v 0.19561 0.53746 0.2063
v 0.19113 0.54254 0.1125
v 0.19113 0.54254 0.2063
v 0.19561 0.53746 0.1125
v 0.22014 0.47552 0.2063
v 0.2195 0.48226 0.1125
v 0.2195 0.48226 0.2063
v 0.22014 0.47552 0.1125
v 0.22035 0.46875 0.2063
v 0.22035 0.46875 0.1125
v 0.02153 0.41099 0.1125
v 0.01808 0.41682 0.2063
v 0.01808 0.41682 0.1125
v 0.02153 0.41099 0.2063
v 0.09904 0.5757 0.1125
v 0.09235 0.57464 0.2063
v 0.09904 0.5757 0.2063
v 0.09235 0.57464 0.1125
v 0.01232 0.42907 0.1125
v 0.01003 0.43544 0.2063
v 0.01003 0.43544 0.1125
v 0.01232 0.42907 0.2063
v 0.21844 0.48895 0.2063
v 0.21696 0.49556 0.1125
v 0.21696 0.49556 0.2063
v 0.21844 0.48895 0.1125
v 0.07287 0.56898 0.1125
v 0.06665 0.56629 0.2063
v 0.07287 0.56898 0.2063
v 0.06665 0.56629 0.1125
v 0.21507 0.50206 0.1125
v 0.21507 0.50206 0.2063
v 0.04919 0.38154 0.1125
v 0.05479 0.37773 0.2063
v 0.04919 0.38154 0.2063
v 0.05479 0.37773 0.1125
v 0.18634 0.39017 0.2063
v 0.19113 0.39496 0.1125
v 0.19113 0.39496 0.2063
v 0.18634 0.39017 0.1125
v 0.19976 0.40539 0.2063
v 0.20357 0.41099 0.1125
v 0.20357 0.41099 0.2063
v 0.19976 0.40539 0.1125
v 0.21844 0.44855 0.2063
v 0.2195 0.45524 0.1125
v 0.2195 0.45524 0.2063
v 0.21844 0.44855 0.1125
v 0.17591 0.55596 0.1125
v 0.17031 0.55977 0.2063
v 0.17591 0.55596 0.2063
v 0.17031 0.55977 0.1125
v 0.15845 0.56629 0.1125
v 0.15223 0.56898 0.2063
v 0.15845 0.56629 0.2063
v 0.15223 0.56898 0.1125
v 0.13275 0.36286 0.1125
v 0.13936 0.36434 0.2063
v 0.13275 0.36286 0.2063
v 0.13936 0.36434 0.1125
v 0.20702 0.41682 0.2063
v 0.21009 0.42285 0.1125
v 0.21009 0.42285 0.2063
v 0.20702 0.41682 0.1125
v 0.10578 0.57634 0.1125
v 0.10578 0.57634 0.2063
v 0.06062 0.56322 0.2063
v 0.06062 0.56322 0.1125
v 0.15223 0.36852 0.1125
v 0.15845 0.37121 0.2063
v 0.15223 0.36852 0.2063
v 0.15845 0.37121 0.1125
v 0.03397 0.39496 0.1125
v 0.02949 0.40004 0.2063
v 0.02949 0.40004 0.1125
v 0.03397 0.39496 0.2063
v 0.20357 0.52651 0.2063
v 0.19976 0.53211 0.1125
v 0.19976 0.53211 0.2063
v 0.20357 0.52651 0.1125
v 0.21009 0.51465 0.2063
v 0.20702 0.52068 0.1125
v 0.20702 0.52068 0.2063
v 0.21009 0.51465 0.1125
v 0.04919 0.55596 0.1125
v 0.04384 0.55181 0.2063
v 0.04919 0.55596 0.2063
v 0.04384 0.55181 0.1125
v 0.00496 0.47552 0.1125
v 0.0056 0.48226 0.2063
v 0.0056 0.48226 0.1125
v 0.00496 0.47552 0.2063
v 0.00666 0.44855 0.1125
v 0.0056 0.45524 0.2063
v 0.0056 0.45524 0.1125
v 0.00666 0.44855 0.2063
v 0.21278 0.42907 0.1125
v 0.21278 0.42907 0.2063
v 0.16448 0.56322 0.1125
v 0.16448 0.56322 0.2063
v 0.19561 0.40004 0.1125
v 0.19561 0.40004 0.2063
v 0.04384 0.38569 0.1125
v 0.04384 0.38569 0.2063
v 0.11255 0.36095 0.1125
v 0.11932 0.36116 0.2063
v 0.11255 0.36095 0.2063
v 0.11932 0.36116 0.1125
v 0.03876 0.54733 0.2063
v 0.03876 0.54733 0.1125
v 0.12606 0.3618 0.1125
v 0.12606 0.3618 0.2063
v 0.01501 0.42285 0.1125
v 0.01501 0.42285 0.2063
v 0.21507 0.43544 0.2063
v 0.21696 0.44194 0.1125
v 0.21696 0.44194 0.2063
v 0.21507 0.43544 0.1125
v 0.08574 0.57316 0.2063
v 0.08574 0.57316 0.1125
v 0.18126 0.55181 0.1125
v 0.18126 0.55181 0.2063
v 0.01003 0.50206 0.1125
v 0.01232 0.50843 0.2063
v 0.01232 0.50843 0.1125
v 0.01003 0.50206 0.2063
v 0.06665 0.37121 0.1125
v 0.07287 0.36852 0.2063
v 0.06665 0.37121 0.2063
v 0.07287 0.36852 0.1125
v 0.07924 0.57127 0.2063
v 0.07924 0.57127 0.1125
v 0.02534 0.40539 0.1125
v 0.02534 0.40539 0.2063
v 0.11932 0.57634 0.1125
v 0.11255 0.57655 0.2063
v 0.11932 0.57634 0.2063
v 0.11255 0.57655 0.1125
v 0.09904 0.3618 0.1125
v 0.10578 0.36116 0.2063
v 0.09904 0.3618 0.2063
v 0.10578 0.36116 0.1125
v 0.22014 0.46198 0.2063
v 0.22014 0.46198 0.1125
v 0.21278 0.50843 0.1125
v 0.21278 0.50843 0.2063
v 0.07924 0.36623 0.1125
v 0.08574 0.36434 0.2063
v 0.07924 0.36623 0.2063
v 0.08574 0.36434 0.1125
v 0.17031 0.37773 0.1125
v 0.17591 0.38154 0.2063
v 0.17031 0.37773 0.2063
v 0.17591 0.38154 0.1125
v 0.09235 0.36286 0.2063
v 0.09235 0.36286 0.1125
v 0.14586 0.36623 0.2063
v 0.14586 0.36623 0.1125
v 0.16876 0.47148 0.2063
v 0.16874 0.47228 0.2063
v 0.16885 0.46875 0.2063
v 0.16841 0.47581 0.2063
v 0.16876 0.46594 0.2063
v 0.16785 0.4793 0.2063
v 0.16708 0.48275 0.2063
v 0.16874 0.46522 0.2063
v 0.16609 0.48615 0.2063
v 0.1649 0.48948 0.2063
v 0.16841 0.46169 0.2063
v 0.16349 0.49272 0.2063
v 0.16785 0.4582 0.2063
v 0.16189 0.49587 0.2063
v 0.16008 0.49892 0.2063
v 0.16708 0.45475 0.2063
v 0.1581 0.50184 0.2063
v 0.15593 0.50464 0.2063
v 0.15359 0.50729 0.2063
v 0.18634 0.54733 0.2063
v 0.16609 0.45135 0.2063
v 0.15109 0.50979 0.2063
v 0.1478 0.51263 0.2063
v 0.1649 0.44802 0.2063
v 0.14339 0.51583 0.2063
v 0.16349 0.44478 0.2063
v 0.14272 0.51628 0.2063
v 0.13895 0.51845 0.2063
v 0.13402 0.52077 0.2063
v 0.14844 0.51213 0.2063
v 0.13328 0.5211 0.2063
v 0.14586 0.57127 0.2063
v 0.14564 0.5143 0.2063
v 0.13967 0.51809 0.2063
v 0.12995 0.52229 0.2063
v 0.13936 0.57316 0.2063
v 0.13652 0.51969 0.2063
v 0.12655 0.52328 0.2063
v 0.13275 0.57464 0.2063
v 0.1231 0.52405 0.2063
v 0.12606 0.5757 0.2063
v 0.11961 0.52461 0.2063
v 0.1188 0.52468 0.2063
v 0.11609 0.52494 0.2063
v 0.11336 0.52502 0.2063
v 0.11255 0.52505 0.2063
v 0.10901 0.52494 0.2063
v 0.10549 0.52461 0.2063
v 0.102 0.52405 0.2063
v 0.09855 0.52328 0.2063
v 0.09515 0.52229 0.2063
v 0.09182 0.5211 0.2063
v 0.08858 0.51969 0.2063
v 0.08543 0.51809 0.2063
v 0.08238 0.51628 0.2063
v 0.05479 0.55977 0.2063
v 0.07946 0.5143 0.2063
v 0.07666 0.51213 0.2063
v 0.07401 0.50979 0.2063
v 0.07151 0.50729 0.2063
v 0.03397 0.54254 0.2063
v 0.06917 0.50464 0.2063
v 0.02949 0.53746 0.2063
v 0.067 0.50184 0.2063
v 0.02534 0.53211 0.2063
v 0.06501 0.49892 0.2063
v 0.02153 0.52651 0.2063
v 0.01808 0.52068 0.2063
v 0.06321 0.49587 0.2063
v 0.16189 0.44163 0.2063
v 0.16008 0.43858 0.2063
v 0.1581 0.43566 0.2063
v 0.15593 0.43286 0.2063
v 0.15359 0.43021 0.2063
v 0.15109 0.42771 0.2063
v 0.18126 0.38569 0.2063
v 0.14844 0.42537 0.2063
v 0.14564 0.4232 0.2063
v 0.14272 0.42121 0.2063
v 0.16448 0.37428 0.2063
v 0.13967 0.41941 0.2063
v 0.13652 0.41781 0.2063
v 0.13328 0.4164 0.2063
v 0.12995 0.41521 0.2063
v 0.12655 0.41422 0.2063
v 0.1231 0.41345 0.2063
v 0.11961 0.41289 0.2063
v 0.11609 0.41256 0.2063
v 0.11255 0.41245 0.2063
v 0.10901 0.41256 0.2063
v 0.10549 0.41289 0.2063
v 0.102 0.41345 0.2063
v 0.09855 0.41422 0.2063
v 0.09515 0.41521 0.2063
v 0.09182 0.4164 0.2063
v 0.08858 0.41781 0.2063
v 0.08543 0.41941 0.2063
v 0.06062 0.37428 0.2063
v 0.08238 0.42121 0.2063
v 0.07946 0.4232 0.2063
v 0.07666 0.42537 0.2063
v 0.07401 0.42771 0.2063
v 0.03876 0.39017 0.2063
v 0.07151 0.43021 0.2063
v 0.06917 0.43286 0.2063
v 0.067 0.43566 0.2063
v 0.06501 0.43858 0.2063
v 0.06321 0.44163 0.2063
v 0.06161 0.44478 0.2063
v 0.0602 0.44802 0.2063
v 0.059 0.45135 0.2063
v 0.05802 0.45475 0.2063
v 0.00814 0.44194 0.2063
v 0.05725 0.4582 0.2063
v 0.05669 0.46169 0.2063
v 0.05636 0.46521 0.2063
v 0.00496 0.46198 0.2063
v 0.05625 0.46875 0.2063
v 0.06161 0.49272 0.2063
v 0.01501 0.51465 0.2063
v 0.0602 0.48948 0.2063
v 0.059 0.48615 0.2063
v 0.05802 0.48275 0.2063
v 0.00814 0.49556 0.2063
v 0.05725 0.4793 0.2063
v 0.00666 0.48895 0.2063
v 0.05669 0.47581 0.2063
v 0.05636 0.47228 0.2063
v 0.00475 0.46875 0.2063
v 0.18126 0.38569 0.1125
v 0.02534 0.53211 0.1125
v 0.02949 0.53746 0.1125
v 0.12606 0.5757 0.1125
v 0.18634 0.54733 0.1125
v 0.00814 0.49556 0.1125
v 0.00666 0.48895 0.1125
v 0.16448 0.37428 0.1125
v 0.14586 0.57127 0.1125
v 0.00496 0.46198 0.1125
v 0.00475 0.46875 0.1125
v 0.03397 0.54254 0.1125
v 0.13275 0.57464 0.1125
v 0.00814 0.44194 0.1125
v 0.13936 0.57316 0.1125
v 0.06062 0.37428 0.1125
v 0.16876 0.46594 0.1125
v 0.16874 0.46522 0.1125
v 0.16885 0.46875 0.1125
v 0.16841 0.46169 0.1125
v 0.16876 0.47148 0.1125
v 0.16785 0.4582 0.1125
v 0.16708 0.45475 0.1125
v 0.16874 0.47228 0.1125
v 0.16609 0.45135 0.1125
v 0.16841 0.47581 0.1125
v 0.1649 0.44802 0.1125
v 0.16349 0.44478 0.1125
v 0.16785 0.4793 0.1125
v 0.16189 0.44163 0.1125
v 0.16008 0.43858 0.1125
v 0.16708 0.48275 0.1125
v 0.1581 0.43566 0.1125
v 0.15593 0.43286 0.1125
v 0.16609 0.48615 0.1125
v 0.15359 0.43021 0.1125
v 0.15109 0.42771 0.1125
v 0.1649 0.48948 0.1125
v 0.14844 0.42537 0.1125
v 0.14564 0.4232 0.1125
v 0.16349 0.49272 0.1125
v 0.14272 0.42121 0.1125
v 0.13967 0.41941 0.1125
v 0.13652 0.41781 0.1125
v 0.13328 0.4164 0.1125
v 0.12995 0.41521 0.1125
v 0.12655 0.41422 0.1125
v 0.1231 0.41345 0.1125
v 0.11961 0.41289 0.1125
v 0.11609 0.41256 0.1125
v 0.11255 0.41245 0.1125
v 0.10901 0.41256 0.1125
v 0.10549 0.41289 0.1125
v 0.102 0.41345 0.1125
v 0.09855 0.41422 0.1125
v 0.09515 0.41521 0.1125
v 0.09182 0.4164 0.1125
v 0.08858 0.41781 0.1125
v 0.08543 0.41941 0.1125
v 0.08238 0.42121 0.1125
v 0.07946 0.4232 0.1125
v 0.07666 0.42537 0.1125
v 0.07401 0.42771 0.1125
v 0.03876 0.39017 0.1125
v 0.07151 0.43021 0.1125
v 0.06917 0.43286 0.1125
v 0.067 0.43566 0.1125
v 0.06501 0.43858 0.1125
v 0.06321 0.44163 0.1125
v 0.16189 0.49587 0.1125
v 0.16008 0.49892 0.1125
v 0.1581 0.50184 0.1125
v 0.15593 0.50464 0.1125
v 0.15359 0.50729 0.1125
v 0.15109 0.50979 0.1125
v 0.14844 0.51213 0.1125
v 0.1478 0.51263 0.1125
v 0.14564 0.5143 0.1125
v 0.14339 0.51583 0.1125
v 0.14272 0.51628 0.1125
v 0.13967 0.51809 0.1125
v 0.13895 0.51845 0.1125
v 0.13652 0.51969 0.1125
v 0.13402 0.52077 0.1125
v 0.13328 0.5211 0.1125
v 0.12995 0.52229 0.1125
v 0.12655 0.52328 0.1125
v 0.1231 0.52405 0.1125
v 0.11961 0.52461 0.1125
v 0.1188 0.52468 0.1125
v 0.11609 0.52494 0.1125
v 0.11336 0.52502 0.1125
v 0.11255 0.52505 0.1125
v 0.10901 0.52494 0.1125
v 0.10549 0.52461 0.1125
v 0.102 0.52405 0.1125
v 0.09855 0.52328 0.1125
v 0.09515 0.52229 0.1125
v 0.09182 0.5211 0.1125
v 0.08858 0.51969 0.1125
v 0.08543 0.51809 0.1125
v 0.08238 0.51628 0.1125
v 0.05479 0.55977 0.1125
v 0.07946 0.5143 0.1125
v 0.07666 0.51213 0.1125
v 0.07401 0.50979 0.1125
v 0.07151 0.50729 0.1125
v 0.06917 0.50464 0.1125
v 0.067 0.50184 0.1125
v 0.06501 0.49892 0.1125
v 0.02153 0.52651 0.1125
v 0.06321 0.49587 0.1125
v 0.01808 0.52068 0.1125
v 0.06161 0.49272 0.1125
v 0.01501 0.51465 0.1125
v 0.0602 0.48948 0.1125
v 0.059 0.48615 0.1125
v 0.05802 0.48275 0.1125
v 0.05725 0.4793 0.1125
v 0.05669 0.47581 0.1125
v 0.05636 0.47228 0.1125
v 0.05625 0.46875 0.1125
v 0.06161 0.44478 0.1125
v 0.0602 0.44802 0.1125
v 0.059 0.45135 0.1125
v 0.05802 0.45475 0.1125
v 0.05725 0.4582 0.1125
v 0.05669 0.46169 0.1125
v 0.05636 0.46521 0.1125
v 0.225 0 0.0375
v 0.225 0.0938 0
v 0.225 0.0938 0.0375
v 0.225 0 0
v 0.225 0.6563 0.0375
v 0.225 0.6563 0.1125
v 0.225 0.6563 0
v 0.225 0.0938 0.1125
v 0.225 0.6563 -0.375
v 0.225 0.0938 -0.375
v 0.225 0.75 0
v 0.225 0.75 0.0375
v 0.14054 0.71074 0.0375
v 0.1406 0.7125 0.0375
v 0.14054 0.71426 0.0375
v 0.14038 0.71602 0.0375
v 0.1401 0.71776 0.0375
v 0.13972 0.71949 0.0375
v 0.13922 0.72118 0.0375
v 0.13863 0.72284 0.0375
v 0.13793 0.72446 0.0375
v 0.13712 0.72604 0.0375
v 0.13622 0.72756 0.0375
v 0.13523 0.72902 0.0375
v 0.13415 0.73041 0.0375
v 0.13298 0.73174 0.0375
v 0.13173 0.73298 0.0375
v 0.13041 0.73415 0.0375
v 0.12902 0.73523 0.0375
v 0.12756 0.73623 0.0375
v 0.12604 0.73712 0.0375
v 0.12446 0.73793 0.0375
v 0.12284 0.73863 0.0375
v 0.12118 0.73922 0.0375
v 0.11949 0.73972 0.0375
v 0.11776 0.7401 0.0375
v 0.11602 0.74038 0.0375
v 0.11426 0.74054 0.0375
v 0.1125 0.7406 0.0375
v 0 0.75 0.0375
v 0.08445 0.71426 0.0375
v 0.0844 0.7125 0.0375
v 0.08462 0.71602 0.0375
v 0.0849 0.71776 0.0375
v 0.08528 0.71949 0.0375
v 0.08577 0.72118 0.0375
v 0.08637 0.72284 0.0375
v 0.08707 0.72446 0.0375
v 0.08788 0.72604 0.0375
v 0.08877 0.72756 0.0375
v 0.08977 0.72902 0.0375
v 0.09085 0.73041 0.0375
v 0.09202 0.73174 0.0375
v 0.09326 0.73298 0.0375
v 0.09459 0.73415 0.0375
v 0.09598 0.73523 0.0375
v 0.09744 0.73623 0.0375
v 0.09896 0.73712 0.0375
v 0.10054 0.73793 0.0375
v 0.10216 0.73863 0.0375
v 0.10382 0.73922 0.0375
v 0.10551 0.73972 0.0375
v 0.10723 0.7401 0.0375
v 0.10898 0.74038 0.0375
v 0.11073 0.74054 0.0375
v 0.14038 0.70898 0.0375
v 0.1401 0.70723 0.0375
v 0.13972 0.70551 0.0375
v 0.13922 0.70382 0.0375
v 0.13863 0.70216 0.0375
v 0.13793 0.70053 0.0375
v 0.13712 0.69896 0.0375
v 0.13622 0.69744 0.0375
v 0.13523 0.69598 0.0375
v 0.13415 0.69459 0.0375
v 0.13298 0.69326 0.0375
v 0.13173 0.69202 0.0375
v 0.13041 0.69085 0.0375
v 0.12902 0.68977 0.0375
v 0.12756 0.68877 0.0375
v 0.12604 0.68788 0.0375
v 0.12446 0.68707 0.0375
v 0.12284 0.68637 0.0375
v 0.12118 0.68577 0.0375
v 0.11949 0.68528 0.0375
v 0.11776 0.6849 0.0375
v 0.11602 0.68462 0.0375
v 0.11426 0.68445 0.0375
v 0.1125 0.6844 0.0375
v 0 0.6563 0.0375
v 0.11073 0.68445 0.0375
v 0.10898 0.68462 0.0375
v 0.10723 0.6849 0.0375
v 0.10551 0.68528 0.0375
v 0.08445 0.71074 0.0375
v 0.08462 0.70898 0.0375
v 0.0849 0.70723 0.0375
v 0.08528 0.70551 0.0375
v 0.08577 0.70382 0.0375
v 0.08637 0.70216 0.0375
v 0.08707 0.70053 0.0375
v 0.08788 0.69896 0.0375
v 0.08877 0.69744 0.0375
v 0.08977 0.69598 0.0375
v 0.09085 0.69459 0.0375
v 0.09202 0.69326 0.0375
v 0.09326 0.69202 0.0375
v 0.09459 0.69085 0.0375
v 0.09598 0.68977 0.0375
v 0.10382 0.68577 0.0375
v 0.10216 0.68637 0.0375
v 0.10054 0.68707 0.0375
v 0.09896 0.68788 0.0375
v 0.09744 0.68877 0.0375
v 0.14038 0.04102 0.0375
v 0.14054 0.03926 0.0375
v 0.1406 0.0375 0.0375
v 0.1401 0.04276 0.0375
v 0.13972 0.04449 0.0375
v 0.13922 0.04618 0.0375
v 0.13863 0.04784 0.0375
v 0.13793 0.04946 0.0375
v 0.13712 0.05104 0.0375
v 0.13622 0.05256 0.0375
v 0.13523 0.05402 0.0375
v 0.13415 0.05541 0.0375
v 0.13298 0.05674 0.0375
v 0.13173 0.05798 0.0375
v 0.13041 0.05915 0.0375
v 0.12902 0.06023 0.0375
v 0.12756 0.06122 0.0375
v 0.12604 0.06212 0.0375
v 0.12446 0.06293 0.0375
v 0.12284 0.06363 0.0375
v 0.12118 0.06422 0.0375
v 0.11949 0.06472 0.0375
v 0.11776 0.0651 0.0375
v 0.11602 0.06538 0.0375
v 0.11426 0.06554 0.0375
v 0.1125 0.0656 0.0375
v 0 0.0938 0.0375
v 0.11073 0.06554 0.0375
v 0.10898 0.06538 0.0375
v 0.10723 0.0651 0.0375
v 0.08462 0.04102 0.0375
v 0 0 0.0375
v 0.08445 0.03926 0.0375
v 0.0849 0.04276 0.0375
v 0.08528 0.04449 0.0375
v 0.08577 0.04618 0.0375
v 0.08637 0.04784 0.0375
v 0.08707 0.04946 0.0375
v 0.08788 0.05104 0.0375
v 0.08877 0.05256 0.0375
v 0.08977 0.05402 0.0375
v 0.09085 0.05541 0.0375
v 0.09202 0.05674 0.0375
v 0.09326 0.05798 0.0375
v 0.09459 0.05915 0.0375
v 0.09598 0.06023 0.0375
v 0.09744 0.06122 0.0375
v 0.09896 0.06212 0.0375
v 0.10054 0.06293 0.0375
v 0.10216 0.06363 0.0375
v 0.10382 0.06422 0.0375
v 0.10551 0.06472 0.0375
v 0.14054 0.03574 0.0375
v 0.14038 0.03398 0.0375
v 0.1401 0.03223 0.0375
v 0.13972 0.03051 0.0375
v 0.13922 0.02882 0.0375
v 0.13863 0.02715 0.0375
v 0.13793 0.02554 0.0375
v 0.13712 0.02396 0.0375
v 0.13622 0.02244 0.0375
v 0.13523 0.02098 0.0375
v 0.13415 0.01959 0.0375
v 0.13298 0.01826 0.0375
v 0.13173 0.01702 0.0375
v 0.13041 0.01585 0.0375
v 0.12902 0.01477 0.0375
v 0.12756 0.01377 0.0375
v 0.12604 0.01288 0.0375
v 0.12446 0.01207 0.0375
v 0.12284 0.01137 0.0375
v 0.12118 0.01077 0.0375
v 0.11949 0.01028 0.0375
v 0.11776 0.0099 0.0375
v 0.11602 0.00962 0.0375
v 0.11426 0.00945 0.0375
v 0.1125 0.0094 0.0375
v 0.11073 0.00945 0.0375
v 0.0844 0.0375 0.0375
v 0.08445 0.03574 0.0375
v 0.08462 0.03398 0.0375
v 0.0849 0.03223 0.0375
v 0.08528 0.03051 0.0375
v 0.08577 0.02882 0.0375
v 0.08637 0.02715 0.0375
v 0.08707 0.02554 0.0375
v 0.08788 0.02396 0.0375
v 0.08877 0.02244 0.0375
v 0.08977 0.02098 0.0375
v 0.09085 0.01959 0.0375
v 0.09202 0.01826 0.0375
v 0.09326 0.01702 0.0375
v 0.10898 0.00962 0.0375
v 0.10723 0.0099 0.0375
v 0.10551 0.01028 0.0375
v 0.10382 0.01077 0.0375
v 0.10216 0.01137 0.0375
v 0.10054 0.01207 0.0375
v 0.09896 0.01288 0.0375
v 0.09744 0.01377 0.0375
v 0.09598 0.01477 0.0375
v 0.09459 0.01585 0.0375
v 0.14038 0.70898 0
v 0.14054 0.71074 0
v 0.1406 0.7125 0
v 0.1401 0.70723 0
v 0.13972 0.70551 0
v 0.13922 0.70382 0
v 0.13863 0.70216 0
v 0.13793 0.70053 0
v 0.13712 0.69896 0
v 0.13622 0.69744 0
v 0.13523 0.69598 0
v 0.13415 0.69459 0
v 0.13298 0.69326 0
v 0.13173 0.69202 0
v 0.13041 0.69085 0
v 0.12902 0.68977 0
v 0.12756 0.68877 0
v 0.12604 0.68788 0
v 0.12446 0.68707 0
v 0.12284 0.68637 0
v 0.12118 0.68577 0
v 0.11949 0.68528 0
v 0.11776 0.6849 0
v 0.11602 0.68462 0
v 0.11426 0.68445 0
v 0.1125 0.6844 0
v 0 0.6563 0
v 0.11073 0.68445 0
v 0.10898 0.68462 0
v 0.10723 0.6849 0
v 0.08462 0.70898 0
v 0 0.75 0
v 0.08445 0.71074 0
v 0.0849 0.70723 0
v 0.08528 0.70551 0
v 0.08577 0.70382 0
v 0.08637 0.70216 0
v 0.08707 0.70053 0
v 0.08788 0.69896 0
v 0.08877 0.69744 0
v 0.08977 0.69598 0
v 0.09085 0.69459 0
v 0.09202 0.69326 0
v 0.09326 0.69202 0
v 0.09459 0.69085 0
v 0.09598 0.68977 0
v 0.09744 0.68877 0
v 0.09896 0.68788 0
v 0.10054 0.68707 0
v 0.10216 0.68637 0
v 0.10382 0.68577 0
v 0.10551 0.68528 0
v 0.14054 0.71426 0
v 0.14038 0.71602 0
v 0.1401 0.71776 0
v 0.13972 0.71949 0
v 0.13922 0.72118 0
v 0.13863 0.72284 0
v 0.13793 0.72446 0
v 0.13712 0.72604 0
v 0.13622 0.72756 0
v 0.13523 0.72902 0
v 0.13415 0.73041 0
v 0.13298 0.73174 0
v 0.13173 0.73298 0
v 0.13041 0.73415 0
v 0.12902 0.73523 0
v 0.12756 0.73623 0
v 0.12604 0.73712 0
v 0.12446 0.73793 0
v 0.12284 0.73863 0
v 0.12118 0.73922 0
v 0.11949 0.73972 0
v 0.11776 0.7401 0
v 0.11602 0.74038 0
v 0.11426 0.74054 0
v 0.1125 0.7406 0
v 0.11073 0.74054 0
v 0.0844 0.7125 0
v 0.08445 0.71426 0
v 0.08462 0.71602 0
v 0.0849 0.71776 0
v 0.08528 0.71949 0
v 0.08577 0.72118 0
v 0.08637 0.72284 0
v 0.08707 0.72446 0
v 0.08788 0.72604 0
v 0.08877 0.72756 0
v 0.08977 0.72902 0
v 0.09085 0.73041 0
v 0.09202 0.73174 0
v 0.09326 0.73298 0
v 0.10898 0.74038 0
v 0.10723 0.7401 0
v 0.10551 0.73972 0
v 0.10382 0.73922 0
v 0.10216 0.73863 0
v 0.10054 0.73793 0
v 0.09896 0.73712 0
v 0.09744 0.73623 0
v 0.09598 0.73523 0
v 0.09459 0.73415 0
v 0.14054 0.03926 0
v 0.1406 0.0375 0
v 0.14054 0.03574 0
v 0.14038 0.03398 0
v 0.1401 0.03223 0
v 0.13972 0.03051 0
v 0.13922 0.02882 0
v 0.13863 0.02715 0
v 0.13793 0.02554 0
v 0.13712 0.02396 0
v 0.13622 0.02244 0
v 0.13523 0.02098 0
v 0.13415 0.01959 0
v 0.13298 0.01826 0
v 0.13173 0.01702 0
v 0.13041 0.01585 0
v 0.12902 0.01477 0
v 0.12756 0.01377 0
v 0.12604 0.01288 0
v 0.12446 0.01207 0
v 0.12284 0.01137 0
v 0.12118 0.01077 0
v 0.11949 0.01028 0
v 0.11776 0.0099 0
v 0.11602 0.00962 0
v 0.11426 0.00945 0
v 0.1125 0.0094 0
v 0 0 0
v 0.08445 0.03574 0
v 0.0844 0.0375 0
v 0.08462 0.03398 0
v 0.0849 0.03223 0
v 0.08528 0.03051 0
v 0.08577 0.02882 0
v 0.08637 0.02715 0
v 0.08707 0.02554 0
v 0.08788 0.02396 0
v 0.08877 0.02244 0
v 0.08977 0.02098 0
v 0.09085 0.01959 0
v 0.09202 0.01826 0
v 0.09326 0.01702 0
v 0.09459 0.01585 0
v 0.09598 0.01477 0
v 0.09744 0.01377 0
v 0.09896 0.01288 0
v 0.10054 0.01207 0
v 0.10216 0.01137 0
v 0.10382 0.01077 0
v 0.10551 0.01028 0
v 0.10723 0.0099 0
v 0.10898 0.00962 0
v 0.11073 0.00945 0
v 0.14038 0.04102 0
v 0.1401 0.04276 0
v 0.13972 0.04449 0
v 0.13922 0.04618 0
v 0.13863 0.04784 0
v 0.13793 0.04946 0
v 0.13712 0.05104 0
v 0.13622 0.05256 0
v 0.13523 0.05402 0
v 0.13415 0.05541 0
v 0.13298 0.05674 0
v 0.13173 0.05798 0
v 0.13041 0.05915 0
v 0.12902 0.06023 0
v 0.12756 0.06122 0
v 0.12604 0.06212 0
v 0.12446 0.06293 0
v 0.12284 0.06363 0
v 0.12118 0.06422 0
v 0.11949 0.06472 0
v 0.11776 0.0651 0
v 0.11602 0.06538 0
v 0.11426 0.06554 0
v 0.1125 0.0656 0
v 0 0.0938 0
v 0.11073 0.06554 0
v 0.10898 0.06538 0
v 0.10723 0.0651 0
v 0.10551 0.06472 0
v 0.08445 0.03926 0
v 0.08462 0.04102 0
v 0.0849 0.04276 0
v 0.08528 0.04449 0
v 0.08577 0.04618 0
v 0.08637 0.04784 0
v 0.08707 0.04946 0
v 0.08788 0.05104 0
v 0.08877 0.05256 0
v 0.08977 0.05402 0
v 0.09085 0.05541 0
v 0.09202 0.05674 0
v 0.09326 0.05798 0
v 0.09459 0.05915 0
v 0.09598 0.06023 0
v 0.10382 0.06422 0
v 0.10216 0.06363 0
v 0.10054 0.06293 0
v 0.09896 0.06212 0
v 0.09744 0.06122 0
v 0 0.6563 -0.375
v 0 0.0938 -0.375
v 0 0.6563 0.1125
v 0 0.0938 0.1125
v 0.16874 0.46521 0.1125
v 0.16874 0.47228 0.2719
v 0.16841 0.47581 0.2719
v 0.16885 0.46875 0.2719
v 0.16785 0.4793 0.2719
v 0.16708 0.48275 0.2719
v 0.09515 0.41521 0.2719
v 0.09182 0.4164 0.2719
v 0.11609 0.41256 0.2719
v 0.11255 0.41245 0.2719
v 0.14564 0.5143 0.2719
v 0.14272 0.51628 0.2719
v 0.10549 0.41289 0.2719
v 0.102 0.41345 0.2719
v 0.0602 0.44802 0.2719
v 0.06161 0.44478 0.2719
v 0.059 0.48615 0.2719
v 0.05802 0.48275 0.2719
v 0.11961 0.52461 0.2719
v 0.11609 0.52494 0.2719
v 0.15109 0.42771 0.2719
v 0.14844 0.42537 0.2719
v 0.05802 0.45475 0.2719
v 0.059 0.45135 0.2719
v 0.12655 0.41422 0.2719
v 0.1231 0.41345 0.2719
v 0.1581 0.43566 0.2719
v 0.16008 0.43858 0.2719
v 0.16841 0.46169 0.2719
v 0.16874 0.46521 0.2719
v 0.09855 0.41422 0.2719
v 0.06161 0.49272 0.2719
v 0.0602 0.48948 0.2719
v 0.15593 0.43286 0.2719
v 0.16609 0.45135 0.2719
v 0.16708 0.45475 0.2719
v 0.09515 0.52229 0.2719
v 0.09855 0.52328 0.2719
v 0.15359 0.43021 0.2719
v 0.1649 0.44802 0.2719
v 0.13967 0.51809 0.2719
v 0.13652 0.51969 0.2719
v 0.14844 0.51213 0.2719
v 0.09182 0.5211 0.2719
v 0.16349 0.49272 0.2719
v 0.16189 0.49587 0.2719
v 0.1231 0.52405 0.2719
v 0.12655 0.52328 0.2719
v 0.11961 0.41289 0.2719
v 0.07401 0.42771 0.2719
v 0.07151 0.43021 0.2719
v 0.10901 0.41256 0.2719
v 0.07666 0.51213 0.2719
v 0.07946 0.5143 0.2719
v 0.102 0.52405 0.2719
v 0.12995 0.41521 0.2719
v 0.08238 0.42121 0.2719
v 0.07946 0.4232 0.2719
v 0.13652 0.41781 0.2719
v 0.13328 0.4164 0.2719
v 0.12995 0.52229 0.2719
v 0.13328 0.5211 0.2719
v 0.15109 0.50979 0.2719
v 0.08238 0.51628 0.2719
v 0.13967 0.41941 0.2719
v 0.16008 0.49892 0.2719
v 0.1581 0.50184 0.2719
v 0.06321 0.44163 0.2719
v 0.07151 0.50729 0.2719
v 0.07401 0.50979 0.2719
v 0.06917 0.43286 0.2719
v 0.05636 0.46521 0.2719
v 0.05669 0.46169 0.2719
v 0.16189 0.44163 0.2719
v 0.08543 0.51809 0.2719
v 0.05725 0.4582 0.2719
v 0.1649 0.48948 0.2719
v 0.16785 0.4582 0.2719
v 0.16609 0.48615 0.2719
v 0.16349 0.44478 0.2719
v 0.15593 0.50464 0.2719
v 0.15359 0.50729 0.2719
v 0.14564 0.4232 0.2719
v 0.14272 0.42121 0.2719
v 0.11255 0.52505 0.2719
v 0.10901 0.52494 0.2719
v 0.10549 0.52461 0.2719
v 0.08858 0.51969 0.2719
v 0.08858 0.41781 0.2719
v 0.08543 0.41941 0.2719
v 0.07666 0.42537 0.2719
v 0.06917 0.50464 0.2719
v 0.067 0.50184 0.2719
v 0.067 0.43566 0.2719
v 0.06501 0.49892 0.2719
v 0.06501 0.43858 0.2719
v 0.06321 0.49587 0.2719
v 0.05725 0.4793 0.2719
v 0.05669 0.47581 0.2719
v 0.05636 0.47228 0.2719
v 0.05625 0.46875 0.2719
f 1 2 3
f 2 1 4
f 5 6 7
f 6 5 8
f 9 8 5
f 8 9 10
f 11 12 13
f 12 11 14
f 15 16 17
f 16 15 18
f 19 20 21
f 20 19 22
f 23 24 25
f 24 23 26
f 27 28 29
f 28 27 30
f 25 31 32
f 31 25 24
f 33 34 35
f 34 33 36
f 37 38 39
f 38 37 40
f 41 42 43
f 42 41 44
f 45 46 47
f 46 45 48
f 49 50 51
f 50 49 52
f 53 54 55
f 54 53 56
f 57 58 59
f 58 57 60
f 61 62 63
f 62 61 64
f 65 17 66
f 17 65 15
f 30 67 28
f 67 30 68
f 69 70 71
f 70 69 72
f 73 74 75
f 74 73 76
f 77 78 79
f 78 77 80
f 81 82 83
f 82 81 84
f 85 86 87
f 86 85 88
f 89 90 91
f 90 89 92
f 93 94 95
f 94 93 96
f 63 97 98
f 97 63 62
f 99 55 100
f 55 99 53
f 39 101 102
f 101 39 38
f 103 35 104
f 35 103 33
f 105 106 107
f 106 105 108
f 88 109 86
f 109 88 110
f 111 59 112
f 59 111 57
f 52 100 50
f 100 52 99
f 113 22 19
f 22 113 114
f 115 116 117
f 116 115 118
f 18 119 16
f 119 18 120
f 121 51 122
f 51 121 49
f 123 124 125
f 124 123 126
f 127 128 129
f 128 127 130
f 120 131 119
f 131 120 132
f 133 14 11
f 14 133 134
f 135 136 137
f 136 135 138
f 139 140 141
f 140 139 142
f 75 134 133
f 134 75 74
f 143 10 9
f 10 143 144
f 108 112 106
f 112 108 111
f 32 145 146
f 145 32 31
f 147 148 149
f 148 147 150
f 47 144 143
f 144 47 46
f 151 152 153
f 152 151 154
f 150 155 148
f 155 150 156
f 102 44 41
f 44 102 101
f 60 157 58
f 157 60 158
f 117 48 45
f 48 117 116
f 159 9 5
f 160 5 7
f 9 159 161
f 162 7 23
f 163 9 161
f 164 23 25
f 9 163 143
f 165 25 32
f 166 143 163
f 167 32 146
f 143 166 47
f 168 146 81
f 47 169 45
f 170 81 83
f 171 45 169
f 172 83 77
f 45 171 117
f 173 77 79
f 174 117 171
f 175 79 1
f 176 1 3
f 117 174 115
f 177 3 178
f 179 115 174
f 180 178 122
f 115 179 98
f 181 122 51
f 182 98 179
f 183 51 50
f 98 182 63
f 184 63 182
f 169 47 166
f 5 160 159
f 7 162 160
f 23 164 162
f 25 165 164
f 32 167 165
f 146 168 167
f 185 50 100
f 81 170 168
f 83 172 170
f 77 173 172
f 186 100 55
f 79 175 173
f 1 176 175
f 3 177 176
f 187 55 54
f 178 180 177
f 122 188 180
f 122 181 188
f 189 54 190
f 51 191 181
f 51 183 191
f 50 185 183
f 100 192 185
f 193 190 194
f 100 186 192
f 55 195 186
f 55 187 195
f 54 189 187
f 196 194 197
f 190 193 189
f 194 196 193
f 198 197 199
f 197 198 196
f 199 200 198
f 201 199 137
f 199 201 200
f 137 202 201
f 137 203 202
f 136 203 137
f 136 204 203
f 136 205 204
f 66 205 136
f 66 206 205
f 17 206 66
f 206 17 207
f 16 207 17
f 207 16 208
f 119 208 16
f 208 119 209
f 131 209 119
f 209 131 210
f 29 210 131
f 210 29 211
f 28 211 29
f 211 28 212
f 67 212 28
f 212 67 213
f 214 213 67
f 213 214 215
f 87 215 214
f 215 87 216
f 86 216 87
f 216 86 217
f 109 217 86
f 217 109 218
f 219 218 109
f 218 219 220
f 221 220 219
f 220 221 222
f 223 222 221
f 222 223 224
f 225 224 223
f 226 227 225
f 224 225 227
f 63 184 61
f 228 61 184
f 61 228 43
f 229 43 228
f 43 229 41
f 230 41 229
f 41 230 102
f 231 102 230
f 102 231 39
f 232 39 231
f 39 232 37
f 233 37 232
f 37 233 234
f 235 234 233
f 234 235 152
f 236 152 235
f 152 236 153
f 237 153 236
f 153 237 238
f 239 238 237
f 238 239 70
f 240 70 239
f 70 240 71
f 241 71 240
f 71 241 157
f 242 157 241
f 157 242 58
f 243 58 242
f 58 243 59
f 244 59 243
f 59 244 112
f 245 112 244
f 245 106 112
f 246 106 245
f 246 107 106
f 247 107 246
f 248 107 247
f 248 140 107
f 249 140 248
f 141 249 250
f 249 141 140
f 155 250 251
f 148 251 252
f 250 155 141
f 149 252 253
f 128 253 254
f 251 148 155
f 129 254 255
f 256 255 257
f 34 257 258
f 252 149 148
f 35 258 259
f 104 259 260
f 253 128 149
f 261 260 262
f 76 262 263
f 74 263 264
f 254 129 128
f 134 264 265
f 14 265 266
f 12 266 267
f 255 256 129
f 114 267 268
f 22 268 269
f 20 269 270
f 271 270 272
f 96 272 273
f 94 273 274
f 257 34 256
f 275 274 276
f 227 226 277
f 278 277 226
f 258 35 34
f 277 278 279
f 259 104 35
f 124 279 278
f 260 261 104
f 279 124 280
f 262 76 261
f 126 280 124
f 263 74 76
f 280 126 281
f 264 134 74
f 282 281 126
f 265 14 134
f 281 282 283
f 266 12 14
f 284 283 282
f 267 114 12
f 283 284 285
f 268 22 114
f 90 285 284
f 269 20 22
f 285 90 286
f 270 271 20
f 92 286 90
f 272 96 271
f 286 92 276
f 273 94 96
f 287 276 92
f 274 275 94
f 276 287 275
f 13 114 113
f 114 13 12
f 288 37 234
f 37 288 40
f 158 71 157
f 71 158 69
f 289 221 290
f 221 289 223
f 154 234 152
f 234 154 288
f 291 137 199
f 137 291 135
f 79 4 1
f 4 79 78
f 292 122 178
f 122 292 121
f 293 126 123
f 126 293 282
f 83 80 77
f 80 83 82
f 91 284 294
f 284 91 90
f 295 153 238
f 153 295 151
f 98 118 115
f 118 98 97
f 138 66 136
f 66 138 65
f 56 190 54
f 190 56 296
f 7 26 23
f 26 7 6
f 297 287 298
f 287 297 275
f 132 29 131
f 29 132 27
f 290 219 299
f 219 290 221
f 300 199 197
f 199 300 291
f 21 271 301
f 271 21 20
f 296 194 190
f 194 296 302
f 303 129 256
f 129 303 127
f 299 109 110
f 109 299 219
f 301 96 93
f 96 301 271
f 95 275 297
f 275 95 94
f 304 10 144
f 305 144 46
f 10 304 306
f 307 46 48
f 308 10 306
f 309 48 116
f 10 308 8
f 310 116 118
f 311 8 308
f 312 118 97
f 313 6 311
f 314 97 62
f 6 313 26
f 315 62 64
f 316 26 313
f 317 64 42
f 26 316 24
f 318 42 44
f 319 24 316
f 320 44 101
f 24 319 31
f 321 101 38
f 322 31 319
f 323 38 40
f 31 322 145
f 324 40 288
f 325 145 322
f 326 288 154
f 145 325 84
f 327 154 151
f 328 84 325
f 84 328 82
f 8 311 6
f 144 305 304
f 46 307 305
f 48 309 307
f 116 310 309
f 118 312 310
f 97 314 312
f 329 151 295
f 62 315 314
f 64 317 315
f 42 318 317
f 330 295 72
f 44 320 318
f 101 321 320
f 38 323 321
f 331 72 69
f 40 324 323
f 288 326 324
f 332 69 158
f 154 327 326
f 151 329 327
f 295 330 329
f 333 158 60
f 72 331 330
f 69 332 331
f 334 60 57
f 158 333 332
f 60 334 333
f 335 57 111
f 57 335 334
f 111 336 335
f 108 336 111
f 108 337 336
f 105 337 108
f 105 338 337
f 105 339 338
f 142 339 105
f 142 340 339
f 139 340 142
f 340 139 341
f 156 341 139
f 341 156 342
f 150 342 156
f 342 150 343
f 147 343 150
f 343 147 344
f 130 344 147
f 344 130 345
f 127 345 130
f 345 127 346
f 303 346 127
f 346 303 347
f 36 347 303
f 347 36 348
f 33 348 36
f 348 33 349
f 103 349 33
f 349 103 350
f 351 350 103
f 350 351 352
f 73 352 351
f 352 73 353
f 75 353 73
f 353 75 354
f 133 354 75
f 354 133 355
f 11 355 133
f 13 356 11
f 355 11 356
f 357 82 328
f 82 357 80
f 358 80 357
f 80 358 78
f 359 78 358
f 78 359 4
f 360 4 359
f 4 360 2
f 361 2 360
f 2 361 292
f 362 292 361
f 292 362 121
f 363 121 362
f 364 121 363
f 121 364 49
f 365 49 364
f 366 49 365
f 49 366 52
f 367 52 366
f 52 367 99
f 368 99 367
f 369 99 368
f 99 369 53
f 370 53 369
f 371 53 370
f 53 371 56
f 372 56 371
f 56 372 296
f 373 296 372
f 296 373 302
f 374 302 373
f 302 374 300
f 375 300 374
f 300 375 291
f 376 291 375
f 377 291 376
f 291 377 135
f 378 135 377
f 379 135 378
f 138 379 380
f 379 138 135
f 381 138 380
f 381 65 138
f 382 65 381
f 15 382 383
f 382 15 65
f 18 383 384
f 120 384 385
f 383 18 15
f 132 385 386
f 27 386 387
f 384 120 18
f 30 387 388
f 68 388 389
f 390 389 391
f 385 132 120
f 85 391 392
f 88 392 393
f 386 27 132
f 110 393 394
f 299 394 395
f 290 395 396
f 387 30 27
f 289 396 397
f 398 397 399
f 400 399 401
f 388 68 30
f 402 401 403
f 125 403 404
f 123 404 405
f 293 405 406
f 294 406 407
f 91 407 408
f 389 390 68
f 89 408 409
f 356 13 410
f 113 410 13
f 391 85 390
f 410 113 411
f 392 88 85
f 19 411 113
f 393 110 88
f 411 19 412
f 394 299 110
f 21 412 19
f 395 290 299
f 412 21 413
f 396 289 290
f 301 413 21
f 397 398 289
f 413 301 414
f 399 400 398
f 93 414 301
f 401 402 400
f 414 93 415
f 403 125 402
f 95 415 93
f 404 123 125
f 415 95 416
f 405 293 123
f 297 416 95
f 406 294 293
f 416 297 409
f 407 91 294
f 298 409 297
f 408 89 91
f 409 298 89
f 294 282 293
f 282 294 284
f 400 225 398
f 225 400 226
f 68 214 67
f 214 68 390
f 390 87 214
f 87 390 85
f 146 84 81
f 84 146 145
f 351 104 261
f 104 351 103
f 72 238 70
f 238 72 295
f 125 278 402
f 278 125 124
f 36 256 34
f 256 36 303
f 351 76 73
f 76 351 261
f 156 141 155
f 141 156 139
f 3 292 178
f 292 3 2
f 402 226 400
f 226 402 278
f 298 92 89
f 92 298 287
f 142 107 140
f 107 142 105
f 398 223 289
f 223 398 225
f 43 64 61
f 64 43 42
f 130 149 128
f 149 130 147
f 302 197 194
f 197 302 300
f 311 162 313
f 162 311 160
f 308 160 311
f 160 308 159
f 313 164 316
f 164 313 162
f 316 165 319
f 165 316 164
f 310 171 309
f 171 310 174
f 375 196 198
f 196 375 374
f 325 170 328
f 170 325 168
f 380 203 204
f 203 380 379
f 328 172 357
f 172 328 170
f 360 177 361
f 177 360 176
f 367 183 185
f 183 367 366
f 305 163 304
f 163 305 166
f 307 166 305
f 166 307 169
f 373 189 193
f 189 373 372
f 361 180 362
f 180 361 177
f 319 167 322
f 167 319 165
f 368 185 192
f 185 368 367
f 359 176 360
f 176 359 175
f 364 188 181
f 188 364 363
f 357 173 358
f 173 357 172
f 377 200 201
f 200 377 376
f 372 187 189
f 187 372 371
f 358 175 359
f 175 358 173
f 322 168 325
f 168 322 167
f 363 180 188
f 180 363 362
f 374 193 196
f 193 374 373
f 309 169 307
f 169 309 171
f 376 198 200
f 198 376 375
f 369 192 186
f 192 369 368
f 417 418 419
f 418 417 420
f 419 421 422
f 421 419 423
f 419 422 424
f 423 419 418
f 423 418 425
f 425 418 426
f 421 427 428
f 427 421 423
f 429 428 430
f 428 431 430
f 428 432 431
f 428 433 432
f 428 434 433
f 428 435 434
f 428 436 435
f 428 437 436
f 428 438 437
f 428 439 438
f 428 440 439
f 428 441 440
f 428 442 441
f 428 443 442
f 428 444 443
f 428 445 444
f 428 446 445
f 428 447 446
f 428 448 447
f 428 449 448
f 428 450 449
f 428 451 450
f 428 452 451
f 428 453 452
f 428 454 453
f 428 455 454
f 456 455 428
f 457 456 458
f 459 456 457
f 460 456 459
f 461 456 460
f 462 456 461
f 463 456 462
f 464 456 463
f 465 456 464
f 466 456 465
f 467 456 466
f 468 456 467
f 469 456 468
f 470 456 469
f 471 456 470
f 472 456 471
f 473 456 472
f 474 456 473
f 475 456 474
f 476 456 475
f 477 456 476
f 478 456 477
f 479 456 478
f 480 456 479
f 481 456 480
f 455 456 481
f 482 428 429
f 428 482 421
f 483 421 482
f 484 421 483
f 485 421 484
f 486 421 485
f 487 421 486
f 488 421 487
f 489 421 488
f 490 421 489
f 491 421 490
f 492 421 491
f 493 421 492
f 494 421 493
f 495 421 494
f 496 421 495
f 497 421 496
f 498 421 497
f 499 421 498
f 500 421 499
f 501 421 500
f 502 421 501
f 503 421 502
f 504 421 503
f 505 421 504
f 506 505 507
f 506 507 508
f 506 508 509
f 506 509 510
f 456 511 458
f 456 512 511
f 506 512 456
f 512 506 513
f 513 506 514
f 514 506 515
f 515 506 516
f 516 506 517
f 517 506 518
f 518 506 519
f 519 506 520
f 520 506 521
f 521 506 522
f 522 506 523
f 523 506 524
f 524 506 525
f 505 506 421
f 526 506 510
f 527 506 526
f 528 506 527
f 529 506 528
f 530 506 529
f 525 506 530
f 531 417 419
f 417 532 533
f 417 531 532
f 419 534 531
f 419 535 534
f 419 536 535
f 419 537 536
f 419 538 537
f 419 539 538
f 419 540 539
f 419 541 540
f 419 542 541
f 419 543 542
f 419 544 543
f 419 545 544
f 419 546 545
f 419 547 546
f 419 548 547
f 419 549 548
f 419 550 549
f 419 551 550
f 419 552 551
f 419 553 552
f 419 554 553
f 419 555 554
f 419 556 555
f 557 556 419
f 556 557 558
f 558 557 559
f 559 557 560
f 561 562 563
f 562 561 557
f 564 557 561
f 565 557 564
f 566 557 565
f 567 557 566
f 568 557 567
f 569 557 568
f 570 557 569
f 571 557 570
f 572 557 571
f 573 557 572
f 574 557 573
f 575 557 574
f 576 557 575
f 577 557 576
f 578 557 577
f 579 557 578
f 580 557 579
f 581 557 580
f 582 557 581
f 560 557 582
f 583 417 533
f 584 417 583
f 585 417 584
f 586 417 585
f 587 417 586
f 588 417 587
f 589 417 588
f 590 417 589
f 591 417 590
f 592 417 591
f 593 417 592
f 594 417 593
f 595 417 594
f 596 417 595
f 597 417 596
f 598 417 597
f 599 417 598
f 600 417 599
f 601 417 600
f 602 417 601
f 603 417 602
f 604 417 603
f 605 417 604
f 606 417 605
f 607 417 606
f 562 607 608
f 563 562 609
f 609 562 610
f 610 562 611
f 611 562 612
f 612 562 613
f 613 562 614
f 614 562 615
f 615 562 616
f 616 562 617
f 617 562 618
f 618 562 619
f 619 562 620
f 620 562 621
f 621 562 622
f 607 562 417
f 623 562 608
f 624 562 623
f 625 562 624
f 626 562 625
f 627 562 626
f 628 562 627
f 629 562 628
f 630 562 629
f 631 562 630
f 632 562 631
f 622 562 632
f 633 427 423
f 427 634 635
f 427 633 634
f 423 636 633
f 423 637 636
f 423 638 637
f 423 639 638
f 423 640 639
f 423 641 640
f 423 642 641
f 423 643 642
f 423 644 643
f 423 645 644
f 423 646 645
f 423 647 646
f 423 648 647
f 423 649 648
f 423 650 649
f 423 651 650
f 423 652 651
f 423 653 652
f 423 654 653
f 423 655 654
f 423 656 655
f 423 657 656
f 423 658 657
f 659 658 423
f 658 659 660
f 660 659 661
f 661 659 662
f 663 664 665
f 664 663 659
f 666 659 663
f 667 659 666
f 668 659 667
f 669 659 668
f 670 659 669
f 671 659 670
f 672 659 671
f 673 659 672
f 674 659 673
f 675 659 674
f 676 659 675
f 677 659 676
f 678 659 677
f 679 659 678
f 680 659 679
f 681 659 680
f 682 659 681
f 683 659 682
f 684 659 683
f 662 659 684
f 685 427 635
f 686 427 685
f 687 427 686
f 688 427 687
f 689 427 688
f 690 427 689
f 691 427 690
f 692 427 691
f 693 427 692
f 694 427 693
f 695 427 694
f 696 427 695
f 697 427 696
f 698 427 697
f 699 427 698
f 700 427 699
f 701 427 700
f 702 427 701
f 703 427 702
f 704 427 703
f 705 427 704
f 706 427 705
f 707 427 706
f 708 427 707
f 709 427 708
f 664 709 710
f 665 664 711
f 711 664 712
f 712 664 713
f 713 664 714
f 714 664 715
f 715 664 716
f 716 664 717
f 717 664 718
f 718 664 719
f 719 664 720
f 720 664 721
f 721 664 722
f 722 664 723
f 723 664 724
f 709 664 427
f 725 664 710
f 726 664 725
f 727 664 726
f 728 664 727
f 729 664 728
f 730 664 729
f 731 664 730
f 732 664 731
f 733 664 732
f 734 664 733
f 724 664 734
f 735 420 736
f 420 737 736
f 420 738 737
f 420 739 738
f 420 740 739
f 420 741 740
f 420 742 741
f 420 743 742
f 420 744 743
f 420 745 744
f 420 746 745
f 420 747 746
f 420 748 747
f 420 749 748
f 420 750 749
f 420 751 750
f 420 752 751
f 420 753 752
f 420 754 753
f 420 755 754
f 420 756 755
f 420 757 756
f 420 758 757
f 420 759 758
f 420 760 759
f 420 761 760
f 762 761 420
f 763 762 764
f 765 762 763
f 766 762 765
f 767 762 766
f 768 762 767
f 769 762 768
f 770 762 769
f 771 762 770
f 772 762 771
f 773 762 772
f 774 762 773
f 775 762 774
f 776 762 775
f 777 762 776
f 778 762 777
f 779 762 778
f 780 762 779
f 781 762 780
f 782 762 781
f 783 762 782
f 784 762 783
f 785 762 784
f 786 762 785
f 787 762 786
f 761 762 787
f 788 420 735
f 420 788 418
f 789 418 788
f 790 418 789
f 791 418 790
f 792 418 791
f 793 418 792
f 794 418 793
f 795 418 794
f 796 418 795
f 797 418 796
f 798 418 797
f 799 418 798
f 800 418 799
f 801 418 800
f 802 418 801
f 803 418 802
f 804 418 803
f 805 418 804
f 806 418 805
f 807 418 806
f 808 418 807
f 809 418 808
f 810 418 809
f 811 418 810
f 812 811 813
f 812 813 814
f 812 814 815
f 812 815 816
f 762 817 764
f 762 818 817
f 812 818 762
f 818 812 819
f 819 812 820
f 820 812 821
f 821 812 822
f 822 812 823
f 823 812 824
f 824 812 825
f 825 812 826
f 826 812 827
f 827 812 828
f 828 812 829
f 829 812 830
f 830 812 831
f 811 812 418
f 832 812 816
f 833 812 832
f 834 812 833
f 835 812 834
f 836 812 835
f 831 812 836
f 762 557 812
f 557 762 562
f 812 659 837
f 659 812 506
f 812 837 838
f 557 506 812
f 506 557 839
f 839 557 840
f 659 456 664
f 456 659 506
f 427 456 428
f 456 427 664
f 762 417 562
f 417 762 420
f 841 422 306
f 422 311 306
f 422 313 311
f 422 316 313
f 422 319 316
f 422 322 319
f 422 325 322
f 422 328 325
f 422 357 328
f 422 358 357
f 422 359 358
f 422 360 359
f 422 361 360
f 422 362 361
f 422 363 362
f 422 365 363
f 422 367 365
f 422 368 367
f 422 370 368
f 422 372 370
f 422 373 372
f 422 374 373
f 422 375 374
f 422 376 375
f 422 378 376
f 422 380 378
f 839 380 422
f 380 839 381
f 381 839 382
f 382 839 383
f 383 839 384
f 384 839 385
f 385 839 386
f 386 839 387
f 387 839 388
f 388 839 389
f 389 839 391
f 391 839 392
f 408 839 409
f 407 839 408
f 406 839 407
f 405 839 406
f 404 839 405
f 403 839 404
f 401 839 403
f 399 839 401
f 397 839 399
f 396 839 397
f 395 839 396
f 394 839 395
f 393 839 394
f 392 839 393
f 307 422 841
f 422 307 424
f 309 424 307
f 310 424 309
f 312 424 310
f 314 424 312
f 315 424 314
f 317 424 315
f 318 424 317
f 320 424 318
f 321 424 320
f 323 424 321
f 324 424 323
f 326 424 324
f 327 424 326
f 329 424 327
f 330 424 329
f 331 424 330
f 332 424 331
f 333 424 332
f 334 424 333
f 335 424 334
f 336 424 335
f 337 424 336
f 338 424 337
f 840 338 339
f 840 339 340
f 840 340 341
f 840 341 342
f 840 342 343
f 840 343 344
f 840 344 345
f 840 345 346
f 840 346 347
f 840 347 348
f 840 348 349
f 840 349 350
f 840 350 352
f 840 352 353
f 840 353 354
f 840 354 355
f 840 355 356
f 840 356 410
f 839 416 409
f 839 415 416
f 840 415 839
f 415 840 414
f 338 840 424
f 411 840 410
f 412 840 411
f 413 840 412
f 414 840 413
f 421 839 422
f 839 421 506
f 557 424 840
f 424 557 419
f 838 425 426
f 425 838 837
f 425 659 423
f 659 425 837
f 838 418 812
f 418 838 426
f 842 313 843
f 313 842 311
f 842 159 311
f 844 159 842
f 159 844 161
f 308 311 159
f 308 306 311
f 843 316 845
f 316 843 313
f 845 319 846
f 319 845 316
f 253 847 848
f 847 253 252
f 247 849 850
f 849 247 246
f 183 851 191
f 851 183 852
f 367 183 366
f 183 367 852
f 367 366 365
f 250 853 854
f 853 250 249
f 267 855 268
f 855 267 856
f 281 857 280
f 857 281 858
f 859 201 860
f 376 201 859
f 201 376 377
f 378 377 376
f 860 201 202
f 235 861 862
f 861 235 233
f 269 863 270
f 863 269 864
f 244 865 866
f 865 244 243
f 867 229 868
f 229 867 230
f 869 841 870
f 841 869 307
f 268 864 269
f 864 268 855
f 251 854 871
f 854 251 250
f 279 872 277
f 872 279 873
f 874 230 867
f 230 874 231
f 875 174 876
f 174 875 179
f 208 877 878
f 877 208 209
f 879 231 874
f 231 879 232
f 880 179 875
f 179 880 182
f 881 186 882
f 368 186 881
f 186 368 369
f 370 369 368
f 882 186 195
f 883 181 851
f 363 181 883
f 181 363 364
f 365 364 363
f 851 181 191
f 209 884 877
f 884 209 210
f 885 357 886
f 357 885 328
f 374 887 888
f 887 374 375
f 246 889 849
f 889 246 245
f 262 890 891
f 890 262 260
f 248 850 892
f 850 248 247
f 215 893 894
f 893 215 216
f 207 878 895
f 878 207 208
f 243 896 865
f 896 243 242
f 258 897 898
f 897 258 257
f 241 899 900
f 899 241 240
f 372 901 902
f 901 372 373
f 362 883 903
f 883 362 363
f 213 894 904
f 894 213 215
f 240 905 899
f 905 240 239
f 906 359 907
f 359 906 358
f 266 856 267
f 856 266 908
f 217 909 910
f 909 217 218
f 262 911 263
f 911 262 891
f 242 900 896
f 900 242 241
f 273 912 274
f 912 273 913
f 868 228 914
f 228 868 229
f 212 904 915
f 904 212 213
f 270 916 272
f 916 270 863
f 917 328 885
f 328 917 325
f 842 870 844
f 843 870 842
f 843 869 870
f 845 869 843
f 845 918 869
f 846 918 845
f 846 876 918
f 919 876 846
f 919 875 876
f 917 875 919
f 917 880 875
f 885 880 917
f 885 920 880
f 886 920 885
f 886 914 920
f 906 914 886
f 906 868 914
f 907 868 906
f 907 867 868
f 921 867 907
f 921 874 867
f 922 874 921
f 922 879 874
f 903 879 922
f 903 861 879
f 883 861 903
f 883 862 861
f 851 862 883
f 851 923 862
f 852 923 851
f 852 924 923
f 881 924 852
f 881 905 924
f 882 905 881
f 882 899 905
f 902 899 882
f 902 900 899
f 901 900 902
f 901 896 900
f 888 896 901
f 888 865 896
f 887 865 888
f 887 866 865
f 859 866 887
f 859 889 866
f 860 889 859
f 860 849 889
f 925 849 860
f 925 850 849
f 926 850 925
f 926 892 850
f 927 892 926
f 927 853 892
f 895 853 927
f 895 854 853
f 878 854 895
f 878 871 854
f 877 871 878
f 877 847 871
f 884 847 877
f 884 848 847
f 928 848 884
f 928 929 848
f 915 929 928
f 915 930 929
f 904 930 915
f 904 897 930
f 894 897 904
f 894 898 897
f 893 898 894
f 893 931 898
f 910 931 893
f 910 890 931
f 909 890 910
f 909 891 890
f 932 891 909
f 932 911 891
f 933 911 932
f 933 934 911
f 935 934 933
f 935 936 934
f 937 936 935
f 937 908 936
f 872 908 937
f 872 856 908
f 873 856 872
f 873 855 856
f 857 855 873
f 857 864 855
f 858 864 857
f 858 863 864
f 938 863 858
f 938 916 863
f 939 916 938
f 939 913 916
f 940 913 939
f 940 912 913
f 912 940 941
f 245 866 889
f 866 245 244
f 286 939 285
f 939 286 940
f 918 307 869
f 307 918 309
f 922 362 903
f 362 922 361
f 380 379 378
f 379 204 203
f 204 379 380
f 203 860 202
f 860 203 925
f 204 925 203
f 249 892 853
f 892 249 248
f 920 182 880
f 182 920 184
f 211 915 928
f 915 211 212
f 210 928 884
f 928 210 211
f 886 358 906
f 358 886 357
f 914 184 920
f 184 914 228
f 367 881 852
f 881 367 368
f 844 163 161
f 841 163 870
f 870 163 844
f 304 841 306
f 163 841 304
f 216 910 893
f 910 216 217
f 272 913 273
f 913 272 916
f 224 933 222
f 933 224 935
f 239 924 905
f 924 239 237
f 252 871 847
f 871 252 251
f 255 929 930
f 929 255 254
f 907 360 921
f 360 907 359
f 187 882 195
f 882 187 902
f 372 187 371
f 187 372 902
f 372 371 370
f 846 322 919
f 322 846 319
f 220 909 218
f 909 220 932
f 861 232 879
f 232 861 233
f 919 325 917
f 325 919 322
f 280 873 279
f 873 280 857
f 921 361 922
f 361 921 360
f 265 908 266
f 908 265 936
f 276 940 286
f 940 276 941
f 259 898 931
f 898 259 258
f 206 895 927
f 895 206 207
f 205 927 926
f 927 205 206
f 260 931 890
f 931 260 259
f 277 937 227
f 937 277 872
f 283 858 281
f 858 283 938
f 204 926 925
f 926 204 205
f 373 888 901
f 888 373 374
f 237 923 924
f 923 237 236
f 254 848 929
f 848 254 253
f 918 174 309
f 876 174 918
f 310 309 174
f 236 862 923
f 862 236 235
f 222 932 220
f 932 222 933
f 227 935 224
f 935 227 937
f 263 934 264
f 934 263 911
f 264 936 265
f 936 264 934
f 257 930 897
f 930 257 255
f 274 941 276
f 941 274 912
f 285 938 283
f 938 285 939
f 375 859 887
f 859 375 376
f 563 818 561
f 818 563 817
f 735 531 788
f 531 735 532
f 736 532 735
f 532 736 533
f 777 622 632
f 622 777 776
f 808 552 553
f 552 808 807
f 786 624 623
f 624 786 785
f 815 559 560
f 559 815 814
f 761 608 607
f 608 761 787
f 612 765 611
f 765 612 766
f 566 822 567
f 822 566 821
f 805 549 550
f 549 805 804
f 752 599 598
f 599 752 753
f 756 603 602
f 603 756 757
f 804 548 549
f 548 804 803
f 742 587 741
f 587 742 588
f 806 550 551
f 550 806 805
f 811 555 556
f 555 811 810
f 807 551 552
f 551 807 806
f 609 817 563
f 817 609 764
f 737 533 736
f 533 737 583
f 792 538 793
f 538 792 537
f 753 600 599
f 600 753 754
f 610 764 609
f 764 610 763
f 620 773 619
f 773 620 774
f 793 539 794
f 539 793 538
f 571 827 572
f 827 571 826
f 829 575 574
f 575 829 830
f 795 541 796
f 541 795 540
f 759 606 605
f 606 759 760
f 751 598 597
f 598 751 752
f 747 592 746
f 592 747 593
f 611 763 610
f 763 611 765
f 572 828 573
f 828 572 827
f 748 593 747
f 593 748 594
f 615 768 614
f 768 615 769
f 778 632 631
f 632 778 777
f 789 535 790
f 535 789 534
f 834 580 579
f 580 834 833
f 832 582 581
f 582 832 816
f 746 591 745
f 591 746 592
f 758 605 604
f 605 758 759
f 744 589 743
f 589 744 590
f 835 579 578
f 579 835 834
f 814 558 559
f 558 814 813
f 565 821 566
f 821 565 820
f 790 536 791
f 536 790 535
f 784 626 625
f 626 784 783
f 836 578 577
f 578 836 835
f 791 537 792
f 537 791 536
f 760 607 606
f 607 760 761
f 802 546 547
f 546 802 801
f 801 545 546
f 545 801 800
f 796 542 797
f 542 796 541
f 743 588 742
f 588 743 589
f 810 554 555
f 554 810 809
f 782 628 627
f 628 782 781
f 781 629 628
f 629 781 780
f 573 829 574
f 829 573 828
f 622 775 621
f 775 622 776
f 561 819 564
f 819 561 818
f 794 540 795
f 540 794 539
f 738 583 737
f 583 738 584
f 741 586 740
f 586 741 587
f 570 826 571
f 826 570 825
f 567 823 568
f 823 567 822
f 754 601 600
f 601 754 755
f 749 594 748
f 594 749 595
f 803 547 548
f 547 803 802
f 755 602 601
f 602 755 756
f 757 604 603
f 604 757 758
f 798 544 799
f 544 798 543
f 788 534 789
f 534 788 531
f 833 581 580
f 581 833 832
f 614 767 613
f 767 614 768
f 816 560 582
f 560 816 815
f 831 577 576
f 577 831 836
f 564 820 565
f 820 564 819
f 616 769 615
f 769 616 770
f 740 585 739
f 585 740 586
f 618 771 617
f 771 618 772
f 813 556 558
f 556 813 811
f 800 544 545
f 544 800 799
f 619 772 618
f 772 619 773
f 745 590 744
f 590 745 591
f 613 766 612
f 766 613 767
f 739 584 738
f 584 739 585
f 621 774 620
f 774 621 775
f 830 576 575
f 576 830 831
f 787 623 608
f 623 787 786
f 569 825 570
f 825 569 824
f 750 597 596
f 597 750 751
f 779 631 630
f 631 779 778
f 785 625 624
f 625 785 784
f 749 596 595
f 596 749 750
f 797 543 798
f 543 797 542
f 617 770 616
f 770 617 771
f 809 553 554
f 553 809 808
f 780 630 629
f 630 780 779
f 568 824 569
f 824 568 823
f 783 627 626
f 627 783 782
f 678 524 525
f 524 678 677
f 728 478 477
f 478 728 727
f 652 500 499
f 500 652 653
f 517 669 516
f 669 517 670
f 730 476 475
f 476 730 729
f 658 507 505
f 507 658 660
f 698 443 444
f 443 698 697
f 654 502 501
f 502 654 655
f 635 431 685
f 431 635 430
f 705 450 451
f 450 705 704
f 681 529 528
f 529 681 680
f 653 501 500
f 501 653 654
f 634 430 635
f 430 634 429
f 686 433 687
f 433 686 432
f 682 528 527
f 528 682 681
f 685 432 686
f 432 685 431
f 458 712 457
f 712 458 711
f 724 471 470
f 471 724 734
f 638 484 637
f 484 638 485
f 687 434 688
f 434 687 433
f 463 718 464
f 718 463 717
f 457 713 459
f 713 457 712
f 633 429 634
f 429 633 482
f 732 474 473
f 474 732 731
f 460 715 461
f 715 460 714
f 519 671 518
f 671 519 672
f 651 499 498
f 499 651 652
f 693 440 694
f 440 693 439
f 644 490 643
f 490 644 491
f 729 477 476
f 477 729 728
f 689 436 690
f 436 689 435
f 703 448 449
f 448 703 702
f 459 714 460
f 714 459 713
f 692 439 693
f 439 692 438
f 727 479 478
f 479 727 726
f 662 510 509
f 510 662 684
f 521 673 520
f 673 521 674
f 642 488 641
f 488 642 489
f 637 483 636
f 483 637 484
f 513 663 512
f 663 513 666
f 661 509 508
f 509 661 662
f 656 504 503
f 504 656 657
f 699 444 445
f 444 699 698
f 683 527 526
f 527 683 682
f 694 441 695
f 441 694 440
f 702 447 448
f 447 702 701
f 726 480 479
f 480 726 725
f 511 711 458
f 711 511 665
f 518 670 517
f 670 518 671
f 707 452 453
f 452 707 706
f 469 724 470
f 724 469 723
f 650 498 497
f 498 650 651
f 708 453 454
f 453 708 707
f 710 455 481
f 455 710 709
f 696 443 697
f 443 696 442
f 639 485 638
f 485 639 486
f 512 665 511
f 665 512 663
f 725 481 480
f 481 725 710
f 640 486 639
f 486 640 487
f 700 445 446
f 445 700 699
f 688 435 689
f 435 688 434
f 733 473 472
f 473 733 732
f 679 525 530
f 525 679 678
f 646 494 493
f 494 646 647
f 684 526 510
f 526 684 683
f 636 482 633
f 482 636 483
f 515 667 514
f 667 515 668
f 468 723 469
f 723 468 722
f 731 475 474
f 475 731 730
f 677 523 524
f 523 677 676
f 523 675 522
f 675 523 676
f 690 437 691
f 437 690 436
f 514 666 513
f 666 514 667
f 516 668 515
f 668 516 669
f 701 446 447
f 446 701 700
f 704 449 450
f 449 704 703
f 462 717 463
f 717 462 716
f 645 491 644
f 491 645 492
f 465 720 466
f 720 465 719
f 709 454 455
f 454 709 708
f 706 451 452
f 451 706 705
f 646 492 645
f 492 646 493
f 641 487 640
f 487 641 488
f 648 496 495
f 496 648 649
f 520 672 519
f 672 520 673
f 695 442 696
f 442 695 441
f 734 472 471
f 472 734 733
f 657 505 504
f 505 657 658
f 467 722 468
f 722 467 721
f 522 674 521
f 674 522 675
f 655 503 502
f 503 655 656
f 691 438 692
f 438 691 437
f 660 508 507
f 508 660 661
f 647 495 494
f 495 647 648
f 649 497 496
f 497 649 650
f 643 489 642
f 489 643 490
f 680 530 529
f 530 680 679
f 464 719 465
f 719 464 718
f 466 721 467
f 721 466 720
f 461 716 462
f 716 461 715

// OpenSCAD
// Parametric dimensions
plate_length = 0.225;
plate_width = 0.75;
plate_thickness = 0.0375;

hole_radius = 0.0281;
hole_x = 0.1125;          // centered along length
hole_y1 = 0.0375;
hole_y2 = 0.7125;

upper_block_width = 0.5625;
upper_block_front_off = 0.0938;   // Y start
upper_block_height = 0.1125;      // rises from base datum (z=0)

lower_block_height = 0.375;       // extends downward from base datum
// lower block sits on same footprint, starts at z = -lower_block_height

// Boss dimensions (centroid slightly differing values averaged)
boss_center_x = 0.11255;          // between 0.1125 and 0.1126
boss_center_y = 0.46875;          // between 0.4687 and 0.4688
collar_outer_r = 0.1078;
collar_inner_r = 0.0563;
collar_h = 0.0938;                // above upper block top
pin_r = 0.0563;
pin_h = 0.1594;                   // above upper block top
shoulder_z = upper_block_height;  // top of upper block = 0.1125

// Smoothness
$fn = 100;

// Main model: subtract through holes from union of all bodies
difference() {
    union() {
        // Thin base plate (bottom at z=0)
        translate([0, 0, 0])
            cube([plate_length, plate_width, plate_thickness]);

        // Central upper rectangular solid
        translate([0, upper_block_front_off, 0])
            cube([plate_length, upper_block_width, upper_block_height]);

        // Matching central underside rectangular solid
        translate([0, upper_block_front_off, -lower_block_height])
            cube([plate_length, upper_block_width, lower_block_height]);

        // Stepped boss on upper block:
        //   lower annular collar (hollow ring)
        translate([boss_center_x, boss_center_y, shoulder_z])
            difference() {
                cylinder(r = collar_outer_r, h = collar_h);
                cylinder(r = collar_inner_r, h = collar_h);
            }
        //   upper solid pin (fills inner cavity up to its own height)
        translate([boss_center_x, boss_center_y, shoulder_z])
            cylinder(r = pin_r, h = pin_h);
    }

    // Two separate through holes in the plate
    translate([hole_x, hole_y1, 0])
        cylinder(r = hole_radius, h = plate_thickness);
    translate([hole_x, hole_y2, 0])
        cylinder(r = hole_radius, h = plate_thickness);
}
